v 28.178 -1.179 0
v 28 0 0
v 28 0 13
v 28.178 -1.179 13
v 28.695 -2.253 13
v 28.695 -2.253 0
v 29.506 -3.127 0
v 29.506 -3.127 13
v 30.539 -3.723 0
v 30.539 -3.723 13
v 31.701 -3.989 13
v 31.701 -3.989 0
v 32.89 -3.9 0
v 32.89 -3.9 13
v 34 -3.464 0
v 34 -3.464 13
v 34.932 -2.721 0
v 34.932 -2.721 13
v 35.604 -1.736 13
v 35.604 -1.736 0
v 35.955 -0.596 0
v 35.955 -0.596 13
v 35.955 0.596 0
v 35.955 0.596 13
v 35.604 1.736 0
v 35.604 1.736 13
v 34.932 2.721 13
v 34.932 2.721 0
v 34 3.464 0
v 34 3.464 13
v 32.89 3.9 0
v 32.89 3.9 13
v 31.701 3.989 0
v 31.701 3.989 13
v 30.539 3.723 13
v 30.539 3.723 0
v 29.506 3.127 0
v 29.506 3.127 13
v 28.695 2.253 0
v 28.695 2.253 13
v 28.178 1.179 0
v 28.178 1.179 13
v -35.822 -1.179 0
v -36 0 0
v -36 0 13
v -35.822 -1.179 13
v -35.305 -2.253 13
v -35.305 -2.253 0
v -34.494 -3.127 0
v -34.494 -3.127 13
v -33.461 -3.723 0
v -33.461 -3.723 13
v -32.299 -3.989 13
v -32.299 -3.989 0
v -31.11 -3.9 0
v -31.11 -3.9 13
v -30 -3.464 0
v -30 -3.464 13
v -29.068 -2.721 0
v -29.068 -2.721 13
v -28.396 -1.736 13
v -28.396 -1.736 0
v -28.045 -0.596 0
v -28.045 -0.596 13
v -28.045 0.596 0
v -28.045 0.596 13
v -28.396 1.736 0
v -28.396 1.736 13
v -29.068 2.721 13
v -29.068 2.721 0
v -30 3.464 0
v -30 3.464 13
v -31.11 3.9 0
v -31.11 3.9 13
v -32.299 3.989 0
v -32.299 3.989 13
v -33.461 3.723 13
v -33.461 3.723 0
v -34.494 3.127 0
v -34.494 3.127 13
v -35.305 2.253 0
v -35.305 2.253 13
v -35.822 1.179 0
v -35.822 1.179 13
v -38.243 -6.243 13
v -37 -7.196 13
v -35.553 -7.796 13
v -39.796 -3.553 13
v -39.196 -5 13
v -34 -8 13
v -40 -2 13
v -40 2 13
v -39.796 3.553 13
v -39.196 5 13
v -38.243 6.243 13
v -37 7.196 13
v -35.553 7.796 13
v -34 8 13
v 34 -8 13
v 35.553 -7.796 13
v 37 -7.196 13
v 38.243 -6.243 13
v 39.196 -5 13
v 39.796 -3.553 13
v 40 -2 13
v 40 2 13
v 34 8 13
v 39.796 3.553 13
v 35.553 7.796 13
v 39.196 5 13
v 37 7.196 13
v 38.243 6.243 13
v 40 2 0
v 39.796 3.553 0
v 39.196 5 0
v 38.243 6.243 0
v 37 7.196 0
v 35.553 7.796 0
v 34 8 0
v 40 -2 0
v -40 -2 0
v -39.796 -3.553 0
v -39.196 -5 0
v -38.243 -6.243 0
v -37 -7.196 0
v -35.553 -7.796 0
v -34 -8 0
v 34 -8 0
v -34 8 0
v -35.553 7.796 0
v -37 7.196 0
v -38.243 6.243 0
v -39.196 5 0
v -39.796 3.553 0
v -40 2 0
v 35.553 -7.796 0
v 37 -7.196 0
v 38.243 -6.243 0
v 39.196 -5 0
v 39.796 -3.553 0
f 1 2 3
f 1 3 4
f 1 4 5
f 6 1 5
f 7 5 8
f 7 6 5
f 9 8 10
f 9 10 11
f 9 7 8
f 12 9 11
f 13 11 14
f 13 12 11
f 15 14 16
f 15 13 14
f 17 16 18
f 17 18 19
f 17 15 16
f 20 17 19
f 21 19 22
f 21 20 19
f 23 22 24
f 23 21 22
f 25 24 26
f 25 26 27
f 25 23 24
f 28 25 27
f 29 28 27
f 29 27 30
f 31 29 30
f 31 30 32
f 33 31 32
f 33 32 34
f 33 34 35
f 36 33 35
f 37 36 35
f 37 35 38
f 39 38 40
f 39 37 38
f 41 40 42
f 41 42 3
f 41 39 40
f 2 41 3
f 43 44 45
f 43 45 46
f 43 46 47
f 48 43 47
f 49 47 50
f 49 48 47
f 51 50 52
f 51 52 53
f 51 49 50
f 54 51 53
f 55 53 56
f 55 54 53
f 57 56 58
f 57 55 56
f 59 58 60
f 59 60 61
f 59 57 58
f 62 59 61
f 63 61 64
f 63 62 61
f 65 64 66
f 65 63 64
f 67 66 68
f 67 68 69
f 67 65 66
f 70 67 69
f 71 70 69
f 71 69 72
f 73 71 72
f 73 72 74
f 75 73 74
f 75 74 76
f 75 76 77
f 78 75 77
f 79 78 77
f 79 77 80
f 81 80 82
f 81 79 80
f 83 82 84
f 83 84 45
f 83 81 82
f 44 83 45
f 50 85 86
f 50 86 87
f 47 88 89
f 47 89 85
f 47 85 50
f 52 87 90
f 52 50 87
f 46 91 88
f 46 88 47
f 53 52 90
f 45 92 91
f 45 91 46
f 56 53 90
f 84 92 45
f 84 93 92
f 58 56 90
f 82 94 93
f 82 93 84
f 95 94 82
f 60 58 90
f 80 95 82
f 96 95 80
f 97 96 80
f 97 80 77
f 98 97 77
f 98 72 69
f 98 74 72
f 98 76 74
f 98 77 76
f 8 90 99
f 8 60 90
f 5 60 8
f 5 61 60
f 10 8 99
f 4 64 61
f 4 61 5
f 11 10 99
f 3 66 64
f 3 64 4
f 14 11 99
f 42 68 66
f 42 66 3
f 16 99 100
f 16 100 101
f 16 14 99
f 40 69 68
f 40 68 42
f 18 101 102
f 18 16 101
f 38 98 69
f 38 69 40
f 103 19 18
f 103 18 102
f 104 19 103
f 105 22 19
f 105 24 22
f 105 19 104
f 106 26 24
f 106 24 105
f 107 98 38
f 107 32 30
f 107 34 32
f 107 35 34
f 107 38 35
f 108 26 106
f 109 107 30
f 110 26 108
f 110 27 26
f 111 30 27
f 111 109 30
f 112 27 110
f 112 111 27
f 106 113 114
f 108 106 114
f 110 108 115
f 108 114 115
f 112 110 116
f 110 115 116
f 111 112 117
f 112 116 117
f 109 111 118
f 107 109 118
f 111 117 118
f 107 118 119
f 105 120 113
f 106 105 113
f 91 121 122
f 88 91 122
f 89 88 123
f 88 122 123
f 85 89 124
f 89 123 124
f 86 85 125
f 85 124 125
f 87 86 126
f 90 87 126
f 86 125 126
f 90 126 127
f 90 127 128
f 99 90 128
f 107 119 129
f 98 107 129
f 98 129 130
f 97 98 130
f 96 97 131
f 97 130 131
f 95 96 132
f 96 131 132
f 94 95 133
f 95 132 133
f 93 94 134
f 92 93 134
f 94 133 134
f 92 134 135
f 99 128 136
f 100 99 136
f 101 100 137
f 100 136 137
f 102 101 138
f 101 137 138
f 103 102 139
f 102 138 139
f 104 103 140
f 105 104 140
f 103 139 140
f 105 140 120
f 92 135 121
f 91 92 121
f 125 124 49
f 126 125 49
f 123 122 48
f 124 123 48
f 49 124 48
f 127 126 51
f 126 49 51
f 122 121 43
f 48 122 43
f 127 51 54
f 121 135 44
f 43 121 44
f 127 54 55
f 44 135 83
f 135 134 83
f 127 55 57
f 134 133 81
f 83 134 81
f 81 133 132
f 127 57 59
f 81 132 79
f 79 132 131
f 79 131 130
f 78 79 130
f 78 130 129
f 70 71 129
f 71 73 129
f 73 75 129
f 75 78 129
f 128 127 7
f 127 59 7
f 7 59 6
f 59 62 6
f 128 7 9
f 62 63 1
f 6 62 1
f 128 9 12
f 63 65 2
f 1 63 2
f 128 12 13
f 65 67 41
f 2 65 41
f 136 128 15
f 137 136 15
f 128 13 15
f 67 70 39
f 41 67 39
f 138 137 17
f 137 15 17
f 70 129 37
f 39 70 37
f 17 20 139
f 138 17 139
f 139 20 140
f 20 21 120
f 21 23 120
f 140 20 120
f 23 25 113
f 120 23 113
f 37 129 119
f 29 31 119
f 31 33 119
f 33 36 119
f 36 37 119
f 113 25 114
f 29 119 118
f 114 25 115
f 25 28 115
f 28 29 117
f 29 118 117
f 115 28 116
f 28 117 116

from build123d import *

# Parameters (mm, degrees)
ESQUISSE1_R        = 4
BOSS_EXTRU_1_DEPTH = 13


with BuildPart() as part:
    # Esquisse1 → Boss.-Extru.1 (new body)
    with BuildSketch(Plane.XY):
        with BuildLine():
            Line((-34, -8), (34, -8))
            ThreePointArc((34, -8), (38.242640687, -6.242640687), (40, -2))
            Line((40, -2), (40, 2))
            ThreePointArc((40, 2), (38.242640687, 6.242640687), (34, 8))
            Line((34, 8), (-34, 8))
            ThreePointArc((-34, 8), (-38.242640687, 6.242640687), (-40, 2))
            Line((-40, 2), (-40, -2))
            ThreePointArc((-40, -2), (-38.242640687, -6.242640687), (-34, -8))
        make_face()
        with Locations(Location((-32, 0, 0), (0, 0, 180))):
            Circle(ESQUISSE1_R, mode=Mode.SUBTRACT)
        with Locations(Location((32, 0, 0), (0, 0, 180))):
            Circle(ESQUISSE1_R, mode=Mode.SUBTRACT)
    extrude(amount=BOSS_EXTRU_1_DEPTH)


solid = part.part
